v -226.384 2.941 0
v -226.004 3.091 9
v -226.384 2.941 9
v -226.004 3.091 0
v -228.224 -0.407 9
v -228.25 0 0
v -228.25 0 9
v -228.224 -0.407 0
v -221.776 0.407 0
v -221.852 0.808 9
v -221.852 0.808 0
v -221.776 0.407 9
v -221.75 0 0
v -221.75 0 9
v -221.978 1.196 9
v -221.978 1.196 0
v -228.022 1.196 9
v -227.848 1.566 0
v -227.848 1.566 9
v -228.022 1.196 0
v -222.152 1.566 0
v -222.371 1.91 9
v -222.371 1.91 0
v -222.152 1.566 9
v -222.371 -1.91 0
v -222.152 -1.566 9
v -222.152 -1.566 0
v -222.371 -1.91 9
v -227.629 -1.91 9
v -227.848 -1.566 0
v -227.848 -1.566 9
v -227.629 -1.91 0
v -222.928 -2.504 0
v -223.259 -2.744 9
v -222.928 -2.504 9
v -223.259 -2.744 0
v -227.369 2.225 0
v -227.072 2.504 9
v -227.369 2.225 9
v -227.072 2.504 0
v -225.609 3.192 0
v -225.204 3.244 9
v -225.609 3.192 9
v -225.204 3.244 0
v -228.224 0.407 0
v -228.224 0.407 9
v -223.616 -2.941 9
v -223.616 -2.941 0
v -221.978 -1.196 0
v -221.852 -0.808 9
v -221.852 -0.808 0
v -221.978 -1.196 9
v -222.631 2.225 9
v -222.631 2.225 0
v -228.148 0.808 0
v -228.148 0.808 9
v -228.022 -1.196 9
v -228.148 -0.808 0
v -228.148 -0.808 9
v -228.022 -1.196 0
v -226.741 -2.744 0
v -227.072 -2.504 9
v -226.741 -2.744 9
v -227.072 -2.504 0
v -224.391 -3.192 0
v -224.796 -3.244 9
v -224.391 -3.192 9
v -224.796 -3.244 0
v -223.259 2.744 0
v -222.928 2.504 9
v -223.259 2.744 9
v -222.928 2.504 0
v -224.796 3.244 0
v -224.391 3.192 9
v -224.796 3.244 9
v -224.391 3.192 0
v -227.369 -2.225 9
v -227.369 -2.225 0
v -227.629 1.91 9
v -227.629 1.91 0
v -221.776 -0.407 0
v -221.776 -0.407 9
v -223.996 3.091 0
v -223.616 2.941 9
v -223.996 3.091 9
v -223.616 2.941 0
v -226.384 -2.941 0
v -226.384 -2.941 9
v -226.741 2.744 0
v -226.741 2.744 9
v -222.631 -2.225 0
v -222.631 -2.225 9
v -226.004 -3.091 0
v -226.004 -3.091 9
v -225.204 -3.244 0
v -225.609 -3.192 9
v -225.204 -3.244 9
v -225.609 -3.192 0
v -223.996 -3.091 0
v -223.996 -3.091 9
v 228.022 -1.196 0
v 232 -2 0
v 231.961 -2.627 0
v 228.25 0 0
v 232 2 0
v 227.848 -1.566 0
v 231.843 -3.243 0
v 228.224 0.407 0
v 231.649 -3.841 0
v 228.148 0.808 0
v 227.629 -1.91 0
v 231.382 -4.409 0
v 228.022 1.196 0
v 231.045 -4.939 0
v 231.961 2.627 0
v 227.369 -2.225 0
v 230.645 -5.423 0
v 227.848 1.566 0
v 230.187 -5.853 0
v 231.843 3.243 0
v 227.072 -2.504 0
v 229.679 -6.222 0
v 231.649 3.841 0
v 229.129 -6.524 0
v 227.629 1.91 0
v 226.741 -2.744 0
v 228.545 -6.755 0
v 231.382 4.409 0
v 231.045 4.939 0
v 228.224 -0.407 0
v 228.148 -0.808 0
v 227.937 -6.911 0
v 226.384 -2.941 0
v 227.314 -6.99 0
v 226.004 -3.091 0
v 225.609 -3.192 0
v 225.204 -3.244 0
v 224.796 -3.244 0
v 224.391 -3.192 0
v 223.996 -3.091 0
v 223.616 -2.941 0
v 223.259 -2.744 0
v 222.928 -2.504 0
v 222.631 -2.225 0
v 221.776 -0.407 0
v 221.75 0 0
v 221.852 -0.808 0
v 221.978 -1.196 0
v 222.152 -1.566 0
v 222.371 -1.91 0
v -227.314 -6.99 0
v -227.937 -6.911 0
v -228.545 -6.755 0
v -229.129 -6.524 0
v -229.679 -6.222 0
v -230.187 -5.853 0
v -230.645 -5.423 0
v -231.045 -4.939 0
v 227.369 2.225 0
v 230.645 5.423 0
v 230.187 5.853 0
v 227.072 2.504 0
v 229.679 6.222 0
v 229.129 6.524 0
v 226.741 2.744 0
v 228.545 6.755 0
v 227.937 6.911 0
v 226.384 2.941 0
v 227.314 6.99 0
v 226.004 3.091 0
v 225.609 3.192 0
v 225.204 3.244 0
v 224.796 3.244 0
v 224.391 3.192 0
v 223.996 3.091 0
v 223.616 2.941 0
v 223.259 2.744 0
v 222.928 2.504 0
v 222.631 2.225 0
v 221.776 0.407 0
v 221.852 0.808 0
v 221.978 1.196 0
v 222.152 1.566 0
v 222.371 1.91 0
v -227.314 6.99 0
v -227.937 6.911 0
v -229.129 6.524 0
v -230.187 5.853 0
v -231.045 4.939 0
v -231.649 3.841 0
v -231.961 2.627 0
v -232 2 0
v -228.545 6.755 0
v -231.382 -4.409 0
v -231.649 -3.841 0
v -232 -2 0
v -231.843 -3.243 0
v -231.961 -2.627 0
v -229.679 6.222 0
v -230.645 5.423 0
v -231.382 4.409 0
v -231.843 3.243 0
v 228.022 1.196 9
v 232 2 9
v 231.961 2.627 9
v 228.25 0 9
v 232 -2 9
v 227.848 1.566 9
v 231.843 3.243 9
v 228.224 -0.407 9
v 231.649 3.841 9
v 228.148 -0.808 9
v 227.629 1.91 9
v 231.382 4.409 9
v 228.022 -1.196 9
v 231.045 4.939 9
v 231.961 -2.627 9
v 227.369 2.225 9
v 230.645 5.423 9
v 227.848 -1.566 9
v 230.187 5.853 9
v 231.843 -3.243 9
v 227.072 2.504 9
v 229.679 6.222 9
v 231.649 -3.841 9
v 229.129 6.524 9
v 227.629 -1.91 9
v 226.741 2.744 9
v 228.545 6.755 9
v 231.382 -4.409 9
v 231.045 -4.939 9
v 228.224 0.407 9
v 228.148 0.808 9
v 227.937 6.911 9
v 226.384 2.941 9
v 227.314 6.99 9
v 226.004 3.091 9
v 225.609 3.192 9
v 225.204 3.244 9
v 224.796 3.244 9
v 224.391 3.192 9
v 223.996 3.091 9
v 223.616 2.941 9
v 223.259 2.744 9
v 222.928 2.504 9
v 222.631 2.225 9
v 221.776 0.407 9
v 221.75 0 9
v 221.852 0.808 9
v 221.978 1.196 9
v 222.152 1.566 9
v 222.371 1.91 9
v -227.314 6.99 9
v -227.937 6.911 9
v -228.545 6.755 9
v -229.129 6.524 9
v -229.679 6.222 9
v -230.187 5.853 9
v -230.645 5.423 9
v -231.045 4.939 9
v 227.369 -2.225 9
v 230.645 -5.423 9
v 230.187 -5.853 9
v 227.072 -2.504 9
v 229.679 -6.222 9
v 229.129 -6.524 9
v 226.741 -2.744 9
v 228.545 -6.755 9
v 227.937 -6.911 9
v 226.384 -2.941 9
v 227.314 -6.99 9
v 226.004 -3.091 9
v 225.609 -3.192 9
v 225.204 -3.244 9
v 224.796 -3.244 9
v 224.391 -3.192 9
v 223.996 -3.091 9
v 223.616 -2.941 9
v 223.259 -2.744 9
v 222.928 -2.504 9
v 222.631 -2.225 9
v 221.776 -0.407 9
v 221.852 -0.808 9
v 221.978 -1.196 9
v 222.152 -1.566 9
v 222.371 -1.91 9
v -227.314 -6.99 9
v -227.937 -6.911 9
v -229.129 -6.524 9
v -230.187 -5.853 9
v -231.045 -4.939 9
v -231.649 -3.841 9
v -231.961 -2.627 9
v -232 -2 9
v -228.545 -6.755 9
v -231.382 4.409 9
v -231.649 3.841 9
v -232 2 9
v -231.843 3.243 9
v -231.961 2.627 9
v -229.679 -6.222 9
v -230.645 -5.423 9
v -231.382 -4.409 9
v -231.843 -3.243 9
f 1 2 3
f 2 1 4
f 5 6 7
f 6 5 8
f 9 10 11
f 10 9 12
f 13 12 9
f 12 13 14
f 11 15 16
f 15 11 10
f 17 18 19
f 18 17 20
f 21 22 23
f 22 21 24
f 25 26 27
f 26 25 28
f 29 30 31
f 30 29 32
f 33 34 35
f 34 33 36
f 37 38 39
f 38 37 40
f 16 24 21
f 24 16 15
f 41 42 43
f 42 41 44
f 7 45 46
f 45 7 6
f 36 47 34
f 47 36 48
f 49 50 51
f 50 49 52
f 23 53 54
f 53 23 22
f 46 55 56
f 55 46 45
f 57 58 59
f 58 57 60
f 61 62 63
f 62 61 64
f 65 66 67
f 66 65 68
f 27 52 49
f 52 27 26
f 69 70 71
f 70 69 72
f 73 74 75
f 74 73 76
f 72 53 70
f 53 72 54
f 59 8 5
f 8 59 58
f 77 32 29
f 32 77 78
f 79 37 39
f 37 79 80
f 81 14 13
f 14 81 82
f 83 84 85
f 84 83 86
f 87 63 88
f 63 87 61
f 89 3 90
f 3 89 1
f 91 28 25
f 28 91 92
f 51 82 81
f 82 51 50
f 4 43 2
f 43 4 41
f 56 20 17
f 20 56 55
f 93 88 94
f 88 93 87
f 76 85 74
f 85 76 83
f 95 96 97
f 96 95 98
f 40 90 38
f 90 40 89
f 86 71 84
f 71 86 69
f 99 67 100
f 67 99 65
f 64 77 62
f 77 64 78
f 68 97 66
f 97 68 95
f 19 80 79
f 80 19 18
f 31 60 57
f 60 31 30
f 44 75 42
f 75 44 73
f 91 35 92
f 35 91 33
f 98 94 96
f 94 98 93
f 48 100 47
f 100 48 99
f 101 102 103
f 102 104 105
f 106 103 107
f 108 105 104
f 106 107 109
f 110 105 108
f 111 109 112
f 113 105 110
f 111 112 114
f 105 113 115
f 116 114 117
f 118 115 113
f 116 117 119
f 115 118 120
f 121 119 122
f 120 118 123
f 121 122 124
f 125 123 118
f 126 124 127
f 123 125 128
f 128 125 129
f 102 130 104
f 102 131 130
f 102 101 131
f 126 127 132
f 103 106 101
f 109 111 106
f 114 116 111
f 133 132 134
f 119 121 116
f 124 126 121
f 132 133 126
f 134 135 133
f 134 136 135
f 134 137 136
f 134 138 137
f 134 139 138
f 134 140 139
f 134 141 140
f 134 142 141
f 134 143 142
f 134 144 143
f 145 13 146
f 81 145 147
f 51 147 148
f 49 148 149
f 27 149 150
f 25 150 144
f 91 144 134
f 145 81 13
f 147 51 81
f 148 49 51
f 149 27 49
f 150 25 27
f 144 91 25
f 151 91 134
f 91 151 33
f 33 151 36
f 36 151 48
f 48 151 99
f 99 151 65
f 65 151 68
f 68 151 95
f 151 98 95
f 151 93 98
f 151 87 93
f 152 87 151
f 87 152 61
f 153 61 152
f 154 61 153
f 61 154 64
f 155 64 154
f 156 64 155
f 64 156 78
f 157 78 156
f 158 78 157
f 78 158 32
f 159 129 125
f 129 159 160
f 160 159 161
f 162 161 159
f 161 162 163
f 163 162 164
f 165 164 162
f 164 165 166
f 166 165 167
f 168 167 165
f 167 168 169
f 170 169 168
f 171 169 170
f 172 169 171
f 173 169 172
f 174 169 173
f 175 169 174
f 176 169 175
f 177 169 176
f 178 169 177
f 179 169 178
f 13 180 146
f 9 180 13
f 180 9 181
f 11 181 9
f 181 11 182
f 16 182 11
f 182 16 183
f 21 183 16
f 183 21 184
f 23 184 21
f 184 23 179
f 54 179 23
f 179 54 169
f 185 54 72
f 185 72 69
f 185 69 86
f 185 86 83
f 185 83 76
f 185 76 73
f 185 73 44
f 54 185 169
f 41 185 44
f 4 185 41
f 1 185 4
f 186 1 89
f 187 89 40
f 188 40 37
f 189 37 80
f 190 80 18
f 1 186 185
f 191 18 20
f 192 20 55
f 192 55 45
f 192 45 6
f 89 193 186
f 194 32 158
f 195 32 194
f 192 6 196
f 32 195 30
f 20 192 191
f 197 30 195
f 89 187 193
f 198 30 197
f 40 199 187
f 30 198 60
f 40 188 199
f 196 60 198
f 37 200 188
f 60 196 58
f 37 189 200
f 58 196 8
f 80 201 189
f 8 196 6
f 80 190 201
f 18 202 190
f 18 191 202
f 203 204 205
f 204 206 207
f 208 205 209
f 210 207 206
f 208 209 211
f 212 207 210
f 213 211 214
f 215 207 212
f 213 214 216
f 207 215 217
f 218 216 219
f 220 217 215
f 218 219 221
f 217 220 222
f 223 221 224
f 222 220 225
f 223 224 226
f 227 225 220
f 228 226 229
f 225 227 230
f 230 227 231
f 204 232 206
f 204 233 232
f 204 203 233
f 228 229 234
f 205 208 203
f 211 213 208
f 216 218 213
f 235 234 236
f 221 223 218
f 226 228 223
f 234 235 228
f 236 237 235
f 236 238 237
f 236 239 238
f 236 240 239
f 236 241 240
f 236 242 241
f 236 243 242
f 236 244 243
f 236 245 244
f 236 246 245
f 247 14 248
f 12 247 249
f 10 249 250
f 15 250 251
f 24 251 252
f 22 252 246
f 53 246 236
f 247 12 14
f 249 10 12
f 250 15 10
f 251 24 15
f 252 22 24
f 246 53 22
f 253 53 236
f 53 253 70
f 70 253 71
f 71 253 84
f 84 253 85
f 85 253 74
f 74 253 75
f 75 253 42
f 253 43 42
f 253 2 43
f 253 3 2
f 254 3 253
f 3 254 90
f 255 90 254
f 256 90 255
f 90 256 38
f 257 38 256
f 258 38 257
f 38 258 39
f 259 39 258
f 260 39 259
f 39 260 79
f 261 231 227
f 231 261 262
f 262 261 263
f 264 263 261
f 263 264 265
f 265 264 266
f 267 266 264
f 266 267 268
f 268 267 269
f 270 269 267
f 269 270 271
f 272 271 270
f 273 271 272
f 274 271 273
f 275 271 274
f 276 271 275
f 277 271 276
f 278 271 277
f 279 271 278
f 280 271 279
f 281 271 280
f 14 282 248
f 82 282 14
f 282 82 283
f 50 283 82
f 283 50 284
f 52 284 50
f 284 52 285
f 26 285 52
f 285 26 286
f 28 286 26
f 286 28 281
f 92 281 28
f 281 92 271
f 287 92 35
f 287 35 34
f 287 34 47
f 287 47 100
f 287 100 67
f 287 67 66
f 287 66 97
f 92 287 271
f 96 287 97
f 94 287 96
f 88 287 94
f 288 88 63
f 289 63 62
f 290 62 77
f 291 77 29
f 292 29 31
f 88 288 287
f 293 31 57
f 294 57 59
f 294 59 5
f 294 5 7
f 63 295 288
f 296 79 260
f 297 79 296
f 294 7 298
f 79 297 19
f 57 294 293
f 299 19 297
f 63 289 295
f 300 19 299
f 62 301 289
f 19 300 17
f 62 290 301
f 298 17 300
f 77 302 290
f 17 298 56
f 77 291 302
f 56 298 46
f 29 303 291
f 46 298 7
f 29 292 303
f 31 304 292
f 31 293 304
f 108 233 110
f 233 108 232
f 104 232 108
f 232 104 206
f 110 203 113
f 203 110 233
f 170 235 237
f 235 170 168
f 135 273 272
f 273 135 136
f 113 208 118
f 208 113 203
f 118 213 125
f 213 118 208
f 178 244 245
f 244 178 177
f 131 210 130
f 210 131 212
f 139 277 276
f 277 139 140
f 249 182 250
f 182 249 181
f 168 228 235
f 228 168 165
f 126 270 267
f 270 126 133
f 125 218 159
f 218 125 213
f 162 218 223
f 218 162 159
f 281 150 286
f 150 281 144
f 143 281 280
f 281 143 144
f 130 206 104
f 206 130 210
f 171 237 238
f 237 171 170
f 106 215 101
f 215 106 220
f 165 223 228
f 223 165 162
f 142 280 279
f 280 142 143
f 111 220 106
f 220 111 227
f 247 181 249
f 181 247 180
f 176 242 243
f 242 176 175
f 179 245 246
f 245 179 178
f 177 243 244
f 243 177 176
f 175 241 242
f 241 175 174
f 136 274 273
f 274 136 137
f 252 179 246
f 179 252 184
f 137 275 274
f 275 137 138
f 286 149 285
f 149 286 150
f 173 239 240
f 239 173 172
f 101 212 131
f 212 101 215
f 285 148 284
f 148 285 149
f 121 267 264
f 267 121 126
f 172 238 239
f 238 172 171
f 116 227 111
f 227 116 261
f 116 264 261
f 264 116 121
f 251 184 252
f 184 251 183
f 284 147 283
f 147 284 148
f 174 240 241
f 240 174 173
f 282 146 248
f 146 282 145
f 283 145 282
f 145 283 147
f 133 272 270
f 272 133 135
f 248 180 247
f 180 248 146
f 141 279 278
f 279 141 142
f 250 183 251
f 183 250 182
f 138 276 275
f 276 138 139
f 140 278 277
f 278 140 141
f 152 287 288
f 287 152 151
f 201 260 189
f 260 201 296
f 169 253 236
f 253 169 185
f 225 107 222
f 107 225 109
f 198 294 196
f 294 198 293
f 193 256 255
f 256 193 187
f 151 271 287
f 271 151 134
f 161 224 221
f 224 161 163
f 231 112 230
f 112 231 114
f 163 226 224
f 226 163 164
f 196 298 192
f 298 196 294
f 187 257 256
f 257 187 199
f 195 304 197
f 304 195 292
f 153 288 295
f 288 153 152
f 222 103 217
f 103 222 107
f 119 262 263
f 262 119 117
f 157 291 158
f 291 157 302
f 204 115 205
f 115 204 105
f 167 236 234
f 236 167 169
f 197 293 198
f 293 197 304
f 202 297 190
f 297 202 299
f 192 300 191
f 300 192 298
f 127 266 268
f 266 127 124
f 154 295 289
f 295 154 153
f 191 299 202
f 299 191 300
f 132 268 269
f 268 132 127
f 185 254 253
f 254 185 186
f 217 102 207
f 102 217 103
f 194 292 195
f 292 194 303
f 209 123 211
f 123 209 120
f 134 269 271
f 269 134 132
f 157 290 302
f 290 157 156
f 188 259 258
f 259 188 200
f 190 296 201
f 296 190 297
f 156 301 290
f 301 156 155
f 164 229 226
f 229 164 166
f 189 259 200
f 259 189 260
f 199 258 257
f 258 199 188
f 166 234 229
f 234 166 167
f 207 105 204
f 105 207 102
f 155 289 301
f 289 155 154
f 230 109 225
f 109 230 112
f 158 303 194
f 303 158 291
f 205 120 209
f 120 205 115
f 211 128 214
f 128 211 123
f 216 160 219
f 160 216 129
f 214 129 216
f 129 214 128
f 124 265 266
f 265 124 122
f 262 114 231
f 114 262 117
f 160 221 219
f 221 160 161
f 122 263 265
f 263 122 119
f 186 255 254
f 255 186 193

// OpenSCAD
$fn = 50;


difference() {
	union() {
		hull() {
			translate(v = [-227.0000000000, 2.0000000000, 0]) {
				cylinder(h = 9, r = 5);
			}
			translate(v = [227.0000000000, 2.0000000000, 0]) {
				cylinder(h = 9, r = 5);
			}
			translate(v = [-227.0000000000, -2.0000000000, 0]) {
				cylinder(h = 9, r = 5);
			}
			translate(v = [227.0000000000, -2.0000000000, 0]) {
				cylinder(h = 9, r = 5);
			}
		}
	}
	union() {
		translate(v = [-225.0000000000, 0.0000000000, 0]) {
			cylinder(h = 9, r = 3.2500000000);
		}
		translate(v = [225.0000000000, 0.0000000000, 0]) {
			cylinder(h = 9, r = 3.2500000000);
		}
		translate(v = [-225.0000000000, 0.0000000000, 0]) {
			cylinder(h = 9, r = 1.8000000000);
		}
		translate(v = [225.0000000000, 0.0000000000, 0]) {
			cylinder(h = 9, r = 1.8000000000);
		}
		translate(v = [-225.0000000000, 0.0000000000, 0]) {
			cylinder(h = 9, r = 1.8000000000);
		}
		translate(v = [225.0000000000, 0.0000000000, 0]) {
			cylinder(h = 9, r = 1.8000000000);
		}
		translate(v = [-225.0000000000, 0.0000000000, 0]) {
			cylinder(h = 9, r = 1.8000000000);
		}
		translate(v = [225.0000000000, 0.0000000000, 0]) {
			cylinder(h = 9, r = 1.8000000000);
		}
	}
}
